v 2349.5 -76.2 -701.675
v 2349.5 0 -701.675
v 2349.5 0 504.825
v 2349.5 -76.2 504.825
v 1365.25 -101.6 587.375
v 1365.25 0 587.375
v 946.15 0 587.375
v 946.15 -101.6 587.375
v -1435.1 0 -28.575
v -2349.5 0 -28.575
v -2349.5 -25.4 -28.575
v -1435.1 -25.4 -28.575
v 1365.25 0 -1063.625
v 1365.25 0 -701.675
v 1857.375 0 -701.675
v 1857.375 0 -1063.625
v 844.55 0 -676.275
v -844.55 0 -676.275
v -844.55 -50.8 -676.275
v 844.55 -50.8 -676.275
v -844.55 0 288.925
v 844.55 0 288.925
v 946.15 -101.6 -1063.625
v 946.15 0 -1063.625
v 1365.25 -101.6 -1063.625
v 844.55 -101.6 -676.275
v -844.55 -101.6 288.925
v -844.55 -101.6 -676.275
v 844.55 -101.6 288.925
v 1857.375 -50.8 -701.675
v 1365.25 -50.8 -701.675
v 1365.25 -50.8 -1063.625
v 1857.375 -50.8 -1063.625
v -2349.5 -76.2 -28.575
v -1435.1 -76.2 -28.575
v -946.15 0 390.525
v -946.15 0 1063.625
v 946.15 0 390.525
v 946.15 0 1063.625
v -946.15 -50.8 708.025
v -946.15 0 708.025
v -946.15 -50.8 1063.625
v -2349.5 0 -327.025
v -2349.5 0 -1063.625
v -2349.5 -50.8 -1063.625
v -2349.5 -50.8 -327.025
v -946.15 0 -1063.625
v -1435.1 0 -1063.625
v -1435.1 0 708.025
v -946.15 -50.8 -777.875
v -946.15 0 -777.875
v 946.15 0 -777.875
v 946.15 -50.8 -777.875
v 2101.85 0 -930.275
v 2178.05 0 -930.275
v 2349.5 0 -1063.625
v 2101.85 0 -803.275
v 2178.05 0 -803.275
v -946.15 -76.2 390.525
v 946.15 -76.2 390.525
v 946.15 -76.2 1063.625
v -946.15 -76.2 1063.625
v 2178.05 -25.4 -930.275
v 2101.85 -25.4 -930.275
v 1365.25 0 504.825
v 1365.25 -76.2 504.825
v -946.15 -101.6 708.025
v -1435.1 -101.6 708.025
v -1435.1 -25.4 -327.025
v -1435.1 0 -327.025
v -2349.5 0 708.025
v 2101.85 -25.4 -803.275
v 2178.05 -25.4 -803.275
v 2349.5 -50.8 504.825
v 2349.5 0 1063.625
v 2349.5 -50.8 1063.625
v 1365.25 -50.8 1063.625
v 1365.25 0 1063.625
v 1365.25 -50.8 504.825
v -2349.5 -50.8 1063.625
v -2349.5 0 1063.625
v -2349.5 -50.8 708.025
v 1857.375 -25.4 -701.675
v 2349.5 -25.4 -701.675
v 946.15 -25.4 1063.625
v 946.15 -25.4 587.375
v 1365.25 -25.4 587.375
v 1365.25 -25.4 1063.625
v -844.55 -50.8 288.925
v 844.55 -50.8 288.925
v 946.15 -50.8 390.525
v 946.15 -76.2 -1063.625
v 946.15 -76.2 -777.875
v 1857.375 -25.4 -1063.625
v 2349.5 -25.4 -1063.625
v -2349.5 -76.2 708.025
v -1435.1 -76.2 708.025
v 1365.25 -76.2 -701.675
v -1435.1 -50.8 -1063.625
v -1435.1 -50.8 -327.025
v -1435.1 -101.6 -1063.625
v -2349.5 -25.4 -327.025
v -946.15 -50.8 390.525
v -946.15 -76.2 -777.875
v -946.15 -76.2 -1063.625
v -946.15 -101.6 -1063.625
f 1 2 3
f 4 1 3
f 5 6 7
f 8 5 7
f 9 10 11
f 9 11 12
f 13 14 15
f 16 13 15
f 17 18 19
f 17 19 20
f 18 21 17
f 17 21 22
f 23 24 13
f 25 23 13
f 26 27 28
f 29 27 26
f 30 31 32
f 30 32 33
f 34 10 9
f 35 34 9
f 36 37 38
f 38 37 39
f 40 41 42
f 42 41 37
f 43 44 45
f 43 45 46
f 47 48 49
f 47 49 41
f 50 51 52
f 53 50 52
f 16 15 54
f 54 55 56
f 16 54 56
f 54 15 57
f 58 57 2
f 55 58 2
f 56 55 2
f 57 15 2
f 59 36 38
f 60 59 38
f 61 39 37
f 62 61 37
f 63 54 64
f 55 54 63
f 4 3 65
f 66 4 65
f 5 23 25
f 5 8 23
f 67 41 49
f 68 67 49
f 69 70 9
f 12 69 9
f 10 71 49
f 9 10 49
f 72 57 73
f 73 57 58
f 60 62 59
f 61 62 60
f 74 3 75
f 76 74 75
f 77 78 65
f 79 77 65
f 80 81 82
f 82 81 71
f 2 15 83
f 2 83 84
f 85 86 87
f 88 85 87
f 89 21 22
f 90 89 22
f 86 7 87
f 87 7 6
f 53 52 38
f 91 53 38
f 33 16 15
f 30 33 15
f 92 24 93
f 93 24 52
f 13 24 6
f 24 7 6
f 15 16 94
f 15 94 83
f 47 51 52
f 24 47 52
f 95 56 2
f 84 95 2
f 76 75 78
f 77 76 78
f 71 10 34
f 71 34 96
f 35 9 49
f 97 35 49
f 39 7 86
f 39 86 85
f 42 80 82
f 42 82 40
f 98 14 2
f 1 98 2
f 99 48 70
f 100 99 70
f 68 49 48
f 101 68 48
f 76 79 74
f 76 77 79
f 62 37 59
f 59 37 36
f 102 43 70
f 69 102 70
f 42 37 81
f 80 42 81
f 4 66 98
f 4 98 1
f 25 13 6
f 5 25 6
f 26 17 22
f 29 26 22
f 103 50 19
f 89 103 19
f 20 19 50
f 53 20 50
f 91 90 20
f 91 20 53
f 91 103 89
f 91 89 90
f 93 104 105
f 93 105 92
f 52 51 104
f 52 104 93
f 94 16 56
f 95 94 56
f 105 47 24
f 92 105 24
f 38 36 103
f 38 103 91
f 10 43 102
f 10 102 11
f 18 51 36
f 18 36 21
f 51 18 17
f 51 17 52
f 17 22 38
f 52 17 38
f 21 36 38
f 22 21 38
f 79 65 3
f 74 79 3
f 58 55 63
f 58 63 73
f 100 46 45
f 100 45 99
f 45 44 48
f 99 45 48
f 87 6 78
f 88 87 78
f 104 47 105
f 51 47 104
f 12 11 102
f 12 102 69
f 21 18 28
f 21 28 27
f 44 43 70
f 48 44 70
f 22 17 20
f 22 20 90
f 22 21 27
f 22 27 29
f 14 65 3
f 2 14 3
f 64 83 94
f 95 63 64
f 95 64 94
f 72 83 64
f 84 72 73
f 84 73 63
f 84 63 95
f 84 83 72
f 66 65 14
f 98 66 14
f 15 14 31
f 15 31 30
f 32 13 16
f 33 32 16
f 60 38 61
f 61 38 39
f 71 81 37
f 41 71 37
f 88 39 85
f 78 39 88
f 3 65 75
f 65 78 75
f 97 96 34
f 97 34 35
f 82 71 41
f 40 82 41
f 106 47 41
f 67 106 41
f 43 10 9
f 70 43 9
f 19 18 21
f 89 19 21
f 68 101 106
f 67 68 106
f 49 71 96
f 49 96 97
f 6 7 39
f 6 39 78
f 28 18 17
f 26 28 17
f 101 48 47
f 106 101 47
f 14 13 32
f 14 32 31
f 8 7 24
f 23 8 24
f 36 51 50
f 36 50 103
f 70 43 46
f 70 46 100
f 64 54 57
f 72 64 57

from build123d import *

# Parameters (mm, degrees)
F1_DEPTH  = 101.6
F0_W      = 914.4
F0_H      = 736.6
F2_DEPTH  = 76.2
F0_W_2    = 1892.3
F0_H_2    = 1168.4
F0_W_3    = 1689.1
F0_H_3    = 965.2
F3_DEPTH  = 50.8
F0_H_4    = 298.45
F4_DEPTH  = 25.4
F5_DEPTH  = 50.8
F6_DEPTH  = 50.8
F7_DEPTH  = 101.6
F8_DEPTH  = 76.2
F0_H_5    = 285.75
F9_DEPTH  = 76.2
F0_W_4    = 419.1
F0_H_6    = 476.25
F10_DEPTH = 25.4
F11_DEPTH = 101.6
F12_DEPTH = 50.8
F13_DEPTH = 76.2
F0_W_5    = 492.125
F0_H_7    = 361.95
F14_DEPTH = 50.8
F0_W_6    = 76.2
F0_H_8    = 127
F15_DEPTH = 25.4


with BuildPart() as f1:
    # F0 (on Front) → F1 (new body)
    with BuildSketch(Plane.XZ):
        Polygon((-1435.1, -1063.625), (-946.15, -1063.625), (-946.15, -777.875), (-946.15, 390.525), (-946.15, 708.025), (-1435.1, 708.025), (-1435.1, -28.575), (-1435.1, -327.025), align=None)
    extrude(amount=F1_DEPTH)


with BuildPart() as f2:
    # F0 (on Front) → F2 (new body)
    with BuildSketch(Plane.XZ):
        with Locations((-1892.3, 339.725)):
            Rectangle(F0_W, F0_H)
    extrude(amount=F2_DEPTH)


with BuildPart() as f3:
    # F0 (on Front) → F3 (new body)
    with BuildSketch(Plane.XZ):
        with Locations((0, -193.675)):
            Rectangle(F0_W_2, F0_H_2)
        with Locations((0, -193.675)):
            Rectangle(F0_W_3, F0_H_3, mode=Mode.SUBTRACT)
    extrude(amount=F3_DEPTH)


with BuildPart() as f4:
    # F0 (on Front) → F4 (new body)
    with BuildSketch(Plane.XZ):
        with Locations((-1892.3, -177.8)):
            Rectangle(F0_W, F0_H_4)
    extrude(amount=F4_DEPTH)


with BuildPart() as f5:
    # F0 (on Front) → F5 (new body)
    with BuildSketch(Plane.XZ):
        with Locations((-1892.3, -695.325)):
            Rectangle(F0_W, F0_H)
    extrude(amount=F5_DEPTH)


with BuildPart() as f6:
    # F0 (on Front) → F6 (new body)
    with BuildSketch(Plane.XZ):
        Polygon((-946.15, 708.025), (-946.15, 1063.625), (-2349.5, 1063.625), (-2349.5, 708.025), (-1435.1, 708.025), align=None)
    extrude(amount=F6_DEPTH)


with BuildPart() as f7:
    # F0 (on Front) → F7 (new body)
    with BuildSketch(Plane.XZ):
        with Locations((0, -193.675)):
            Rectangle(F0_W_3, F0_H_3)
    extrude(amount=F7_DEPTH)


with BuildPart() as f8:
    # F0 (on Front) → F8 (new body)
    with BuildSketch(Plane.XZ):
        Polygon((-946.15, 390.525), (946.15, 390.525), (946.15, 587.375), (946.15, 1063.625), (-946.15, 1063.625), (-946.15, 708.025), align=None)
    extrude(amount=F8_DEPTH)


with BuildPart() as f9:
    # F0 (on Front) → F9 (new body)
    with BuildSketch(Plane.XZ):
        with Locations((0, -920.75)):
            Rectangle(F0_W_2, F0_H_5)
    extrude(amount=F9_DEPTH)


with BuildPart() as f10:
    # F0 (on Front) → F10 (new body)
    with BuildSketch(Plane.XZ):
        with Locations((1155.7, 825.5)):
            Rectangle(F0_W_4, F0_H_6)
    extrude(amount=F10_DEPTH)


with BuildPart() as f11:
    # F0 (on Front) → F11 (new body)
    with BuildSketch(Plane.XZ):
        Polygon((946.15, -1063.625), (1365.25, -1063.625), (1365.25, -701.675), (1365.25, 504.825), (1365.25, 587.375), (946.15, 587.375), (946.15, 390.525), (946.15, -777.875), align=None)
    extrude(amount=F11_DEPTH)


with BuildPart() as f12:
    # F0 (on Front) → F12 (new body)
    with BuildSketch(Plane.XZ):
        Polygon((1365.25, 504.825), (2349.5, 504.825), (2349.5, 1063.625), (1365.25, 1063.625), (1365.25, 587.375), align=None)
    extrude(amount=F12_DEPTH)


with BuildPart() as f13:
    # F0 (on Front) → F13 (new body)
    with BuildSketch(Plane.XZ):
        Polygon((1857.375, -701.675), (2349.5, -701.675), (2349.5, 504.825), (1365.25, 504.825), (1365.25, -701.675), align=None)
    extrude(amount=F13_DEPTH)


with BuildPart() as f14:
    # F0 (on Front) → F14 (new body)
    with BuildSketch(Plane.XZ):
        with Locations((1611.3125, -882.65)):
            Rectangle(F0_W_5, F0_H_7)
    extrude(amount=F14_DEPTH)


with BuildPart() as f15:
    # F0 (on Front) → F15 (new body)
    with BuildSketch(Plane.XZ):
        with Locations((2103.4375, -882.65)):
            Rectangle(F0_W_5, F0_H_7)
        with Locations((2139.95, -866.775)):
            Rectangle(F0_W_6, F0_H_8, mode=Mode.SUBTRACT)
    extrude(amount=F15_DEPTH)


solid = Compound([f1.part, f2.part, f3.part, f4.part, f5.part, f6.part, f7.part, f8.part, f9.part, f10.part, f11.part, f12.part, f13.part, f14.part, f15.part])
